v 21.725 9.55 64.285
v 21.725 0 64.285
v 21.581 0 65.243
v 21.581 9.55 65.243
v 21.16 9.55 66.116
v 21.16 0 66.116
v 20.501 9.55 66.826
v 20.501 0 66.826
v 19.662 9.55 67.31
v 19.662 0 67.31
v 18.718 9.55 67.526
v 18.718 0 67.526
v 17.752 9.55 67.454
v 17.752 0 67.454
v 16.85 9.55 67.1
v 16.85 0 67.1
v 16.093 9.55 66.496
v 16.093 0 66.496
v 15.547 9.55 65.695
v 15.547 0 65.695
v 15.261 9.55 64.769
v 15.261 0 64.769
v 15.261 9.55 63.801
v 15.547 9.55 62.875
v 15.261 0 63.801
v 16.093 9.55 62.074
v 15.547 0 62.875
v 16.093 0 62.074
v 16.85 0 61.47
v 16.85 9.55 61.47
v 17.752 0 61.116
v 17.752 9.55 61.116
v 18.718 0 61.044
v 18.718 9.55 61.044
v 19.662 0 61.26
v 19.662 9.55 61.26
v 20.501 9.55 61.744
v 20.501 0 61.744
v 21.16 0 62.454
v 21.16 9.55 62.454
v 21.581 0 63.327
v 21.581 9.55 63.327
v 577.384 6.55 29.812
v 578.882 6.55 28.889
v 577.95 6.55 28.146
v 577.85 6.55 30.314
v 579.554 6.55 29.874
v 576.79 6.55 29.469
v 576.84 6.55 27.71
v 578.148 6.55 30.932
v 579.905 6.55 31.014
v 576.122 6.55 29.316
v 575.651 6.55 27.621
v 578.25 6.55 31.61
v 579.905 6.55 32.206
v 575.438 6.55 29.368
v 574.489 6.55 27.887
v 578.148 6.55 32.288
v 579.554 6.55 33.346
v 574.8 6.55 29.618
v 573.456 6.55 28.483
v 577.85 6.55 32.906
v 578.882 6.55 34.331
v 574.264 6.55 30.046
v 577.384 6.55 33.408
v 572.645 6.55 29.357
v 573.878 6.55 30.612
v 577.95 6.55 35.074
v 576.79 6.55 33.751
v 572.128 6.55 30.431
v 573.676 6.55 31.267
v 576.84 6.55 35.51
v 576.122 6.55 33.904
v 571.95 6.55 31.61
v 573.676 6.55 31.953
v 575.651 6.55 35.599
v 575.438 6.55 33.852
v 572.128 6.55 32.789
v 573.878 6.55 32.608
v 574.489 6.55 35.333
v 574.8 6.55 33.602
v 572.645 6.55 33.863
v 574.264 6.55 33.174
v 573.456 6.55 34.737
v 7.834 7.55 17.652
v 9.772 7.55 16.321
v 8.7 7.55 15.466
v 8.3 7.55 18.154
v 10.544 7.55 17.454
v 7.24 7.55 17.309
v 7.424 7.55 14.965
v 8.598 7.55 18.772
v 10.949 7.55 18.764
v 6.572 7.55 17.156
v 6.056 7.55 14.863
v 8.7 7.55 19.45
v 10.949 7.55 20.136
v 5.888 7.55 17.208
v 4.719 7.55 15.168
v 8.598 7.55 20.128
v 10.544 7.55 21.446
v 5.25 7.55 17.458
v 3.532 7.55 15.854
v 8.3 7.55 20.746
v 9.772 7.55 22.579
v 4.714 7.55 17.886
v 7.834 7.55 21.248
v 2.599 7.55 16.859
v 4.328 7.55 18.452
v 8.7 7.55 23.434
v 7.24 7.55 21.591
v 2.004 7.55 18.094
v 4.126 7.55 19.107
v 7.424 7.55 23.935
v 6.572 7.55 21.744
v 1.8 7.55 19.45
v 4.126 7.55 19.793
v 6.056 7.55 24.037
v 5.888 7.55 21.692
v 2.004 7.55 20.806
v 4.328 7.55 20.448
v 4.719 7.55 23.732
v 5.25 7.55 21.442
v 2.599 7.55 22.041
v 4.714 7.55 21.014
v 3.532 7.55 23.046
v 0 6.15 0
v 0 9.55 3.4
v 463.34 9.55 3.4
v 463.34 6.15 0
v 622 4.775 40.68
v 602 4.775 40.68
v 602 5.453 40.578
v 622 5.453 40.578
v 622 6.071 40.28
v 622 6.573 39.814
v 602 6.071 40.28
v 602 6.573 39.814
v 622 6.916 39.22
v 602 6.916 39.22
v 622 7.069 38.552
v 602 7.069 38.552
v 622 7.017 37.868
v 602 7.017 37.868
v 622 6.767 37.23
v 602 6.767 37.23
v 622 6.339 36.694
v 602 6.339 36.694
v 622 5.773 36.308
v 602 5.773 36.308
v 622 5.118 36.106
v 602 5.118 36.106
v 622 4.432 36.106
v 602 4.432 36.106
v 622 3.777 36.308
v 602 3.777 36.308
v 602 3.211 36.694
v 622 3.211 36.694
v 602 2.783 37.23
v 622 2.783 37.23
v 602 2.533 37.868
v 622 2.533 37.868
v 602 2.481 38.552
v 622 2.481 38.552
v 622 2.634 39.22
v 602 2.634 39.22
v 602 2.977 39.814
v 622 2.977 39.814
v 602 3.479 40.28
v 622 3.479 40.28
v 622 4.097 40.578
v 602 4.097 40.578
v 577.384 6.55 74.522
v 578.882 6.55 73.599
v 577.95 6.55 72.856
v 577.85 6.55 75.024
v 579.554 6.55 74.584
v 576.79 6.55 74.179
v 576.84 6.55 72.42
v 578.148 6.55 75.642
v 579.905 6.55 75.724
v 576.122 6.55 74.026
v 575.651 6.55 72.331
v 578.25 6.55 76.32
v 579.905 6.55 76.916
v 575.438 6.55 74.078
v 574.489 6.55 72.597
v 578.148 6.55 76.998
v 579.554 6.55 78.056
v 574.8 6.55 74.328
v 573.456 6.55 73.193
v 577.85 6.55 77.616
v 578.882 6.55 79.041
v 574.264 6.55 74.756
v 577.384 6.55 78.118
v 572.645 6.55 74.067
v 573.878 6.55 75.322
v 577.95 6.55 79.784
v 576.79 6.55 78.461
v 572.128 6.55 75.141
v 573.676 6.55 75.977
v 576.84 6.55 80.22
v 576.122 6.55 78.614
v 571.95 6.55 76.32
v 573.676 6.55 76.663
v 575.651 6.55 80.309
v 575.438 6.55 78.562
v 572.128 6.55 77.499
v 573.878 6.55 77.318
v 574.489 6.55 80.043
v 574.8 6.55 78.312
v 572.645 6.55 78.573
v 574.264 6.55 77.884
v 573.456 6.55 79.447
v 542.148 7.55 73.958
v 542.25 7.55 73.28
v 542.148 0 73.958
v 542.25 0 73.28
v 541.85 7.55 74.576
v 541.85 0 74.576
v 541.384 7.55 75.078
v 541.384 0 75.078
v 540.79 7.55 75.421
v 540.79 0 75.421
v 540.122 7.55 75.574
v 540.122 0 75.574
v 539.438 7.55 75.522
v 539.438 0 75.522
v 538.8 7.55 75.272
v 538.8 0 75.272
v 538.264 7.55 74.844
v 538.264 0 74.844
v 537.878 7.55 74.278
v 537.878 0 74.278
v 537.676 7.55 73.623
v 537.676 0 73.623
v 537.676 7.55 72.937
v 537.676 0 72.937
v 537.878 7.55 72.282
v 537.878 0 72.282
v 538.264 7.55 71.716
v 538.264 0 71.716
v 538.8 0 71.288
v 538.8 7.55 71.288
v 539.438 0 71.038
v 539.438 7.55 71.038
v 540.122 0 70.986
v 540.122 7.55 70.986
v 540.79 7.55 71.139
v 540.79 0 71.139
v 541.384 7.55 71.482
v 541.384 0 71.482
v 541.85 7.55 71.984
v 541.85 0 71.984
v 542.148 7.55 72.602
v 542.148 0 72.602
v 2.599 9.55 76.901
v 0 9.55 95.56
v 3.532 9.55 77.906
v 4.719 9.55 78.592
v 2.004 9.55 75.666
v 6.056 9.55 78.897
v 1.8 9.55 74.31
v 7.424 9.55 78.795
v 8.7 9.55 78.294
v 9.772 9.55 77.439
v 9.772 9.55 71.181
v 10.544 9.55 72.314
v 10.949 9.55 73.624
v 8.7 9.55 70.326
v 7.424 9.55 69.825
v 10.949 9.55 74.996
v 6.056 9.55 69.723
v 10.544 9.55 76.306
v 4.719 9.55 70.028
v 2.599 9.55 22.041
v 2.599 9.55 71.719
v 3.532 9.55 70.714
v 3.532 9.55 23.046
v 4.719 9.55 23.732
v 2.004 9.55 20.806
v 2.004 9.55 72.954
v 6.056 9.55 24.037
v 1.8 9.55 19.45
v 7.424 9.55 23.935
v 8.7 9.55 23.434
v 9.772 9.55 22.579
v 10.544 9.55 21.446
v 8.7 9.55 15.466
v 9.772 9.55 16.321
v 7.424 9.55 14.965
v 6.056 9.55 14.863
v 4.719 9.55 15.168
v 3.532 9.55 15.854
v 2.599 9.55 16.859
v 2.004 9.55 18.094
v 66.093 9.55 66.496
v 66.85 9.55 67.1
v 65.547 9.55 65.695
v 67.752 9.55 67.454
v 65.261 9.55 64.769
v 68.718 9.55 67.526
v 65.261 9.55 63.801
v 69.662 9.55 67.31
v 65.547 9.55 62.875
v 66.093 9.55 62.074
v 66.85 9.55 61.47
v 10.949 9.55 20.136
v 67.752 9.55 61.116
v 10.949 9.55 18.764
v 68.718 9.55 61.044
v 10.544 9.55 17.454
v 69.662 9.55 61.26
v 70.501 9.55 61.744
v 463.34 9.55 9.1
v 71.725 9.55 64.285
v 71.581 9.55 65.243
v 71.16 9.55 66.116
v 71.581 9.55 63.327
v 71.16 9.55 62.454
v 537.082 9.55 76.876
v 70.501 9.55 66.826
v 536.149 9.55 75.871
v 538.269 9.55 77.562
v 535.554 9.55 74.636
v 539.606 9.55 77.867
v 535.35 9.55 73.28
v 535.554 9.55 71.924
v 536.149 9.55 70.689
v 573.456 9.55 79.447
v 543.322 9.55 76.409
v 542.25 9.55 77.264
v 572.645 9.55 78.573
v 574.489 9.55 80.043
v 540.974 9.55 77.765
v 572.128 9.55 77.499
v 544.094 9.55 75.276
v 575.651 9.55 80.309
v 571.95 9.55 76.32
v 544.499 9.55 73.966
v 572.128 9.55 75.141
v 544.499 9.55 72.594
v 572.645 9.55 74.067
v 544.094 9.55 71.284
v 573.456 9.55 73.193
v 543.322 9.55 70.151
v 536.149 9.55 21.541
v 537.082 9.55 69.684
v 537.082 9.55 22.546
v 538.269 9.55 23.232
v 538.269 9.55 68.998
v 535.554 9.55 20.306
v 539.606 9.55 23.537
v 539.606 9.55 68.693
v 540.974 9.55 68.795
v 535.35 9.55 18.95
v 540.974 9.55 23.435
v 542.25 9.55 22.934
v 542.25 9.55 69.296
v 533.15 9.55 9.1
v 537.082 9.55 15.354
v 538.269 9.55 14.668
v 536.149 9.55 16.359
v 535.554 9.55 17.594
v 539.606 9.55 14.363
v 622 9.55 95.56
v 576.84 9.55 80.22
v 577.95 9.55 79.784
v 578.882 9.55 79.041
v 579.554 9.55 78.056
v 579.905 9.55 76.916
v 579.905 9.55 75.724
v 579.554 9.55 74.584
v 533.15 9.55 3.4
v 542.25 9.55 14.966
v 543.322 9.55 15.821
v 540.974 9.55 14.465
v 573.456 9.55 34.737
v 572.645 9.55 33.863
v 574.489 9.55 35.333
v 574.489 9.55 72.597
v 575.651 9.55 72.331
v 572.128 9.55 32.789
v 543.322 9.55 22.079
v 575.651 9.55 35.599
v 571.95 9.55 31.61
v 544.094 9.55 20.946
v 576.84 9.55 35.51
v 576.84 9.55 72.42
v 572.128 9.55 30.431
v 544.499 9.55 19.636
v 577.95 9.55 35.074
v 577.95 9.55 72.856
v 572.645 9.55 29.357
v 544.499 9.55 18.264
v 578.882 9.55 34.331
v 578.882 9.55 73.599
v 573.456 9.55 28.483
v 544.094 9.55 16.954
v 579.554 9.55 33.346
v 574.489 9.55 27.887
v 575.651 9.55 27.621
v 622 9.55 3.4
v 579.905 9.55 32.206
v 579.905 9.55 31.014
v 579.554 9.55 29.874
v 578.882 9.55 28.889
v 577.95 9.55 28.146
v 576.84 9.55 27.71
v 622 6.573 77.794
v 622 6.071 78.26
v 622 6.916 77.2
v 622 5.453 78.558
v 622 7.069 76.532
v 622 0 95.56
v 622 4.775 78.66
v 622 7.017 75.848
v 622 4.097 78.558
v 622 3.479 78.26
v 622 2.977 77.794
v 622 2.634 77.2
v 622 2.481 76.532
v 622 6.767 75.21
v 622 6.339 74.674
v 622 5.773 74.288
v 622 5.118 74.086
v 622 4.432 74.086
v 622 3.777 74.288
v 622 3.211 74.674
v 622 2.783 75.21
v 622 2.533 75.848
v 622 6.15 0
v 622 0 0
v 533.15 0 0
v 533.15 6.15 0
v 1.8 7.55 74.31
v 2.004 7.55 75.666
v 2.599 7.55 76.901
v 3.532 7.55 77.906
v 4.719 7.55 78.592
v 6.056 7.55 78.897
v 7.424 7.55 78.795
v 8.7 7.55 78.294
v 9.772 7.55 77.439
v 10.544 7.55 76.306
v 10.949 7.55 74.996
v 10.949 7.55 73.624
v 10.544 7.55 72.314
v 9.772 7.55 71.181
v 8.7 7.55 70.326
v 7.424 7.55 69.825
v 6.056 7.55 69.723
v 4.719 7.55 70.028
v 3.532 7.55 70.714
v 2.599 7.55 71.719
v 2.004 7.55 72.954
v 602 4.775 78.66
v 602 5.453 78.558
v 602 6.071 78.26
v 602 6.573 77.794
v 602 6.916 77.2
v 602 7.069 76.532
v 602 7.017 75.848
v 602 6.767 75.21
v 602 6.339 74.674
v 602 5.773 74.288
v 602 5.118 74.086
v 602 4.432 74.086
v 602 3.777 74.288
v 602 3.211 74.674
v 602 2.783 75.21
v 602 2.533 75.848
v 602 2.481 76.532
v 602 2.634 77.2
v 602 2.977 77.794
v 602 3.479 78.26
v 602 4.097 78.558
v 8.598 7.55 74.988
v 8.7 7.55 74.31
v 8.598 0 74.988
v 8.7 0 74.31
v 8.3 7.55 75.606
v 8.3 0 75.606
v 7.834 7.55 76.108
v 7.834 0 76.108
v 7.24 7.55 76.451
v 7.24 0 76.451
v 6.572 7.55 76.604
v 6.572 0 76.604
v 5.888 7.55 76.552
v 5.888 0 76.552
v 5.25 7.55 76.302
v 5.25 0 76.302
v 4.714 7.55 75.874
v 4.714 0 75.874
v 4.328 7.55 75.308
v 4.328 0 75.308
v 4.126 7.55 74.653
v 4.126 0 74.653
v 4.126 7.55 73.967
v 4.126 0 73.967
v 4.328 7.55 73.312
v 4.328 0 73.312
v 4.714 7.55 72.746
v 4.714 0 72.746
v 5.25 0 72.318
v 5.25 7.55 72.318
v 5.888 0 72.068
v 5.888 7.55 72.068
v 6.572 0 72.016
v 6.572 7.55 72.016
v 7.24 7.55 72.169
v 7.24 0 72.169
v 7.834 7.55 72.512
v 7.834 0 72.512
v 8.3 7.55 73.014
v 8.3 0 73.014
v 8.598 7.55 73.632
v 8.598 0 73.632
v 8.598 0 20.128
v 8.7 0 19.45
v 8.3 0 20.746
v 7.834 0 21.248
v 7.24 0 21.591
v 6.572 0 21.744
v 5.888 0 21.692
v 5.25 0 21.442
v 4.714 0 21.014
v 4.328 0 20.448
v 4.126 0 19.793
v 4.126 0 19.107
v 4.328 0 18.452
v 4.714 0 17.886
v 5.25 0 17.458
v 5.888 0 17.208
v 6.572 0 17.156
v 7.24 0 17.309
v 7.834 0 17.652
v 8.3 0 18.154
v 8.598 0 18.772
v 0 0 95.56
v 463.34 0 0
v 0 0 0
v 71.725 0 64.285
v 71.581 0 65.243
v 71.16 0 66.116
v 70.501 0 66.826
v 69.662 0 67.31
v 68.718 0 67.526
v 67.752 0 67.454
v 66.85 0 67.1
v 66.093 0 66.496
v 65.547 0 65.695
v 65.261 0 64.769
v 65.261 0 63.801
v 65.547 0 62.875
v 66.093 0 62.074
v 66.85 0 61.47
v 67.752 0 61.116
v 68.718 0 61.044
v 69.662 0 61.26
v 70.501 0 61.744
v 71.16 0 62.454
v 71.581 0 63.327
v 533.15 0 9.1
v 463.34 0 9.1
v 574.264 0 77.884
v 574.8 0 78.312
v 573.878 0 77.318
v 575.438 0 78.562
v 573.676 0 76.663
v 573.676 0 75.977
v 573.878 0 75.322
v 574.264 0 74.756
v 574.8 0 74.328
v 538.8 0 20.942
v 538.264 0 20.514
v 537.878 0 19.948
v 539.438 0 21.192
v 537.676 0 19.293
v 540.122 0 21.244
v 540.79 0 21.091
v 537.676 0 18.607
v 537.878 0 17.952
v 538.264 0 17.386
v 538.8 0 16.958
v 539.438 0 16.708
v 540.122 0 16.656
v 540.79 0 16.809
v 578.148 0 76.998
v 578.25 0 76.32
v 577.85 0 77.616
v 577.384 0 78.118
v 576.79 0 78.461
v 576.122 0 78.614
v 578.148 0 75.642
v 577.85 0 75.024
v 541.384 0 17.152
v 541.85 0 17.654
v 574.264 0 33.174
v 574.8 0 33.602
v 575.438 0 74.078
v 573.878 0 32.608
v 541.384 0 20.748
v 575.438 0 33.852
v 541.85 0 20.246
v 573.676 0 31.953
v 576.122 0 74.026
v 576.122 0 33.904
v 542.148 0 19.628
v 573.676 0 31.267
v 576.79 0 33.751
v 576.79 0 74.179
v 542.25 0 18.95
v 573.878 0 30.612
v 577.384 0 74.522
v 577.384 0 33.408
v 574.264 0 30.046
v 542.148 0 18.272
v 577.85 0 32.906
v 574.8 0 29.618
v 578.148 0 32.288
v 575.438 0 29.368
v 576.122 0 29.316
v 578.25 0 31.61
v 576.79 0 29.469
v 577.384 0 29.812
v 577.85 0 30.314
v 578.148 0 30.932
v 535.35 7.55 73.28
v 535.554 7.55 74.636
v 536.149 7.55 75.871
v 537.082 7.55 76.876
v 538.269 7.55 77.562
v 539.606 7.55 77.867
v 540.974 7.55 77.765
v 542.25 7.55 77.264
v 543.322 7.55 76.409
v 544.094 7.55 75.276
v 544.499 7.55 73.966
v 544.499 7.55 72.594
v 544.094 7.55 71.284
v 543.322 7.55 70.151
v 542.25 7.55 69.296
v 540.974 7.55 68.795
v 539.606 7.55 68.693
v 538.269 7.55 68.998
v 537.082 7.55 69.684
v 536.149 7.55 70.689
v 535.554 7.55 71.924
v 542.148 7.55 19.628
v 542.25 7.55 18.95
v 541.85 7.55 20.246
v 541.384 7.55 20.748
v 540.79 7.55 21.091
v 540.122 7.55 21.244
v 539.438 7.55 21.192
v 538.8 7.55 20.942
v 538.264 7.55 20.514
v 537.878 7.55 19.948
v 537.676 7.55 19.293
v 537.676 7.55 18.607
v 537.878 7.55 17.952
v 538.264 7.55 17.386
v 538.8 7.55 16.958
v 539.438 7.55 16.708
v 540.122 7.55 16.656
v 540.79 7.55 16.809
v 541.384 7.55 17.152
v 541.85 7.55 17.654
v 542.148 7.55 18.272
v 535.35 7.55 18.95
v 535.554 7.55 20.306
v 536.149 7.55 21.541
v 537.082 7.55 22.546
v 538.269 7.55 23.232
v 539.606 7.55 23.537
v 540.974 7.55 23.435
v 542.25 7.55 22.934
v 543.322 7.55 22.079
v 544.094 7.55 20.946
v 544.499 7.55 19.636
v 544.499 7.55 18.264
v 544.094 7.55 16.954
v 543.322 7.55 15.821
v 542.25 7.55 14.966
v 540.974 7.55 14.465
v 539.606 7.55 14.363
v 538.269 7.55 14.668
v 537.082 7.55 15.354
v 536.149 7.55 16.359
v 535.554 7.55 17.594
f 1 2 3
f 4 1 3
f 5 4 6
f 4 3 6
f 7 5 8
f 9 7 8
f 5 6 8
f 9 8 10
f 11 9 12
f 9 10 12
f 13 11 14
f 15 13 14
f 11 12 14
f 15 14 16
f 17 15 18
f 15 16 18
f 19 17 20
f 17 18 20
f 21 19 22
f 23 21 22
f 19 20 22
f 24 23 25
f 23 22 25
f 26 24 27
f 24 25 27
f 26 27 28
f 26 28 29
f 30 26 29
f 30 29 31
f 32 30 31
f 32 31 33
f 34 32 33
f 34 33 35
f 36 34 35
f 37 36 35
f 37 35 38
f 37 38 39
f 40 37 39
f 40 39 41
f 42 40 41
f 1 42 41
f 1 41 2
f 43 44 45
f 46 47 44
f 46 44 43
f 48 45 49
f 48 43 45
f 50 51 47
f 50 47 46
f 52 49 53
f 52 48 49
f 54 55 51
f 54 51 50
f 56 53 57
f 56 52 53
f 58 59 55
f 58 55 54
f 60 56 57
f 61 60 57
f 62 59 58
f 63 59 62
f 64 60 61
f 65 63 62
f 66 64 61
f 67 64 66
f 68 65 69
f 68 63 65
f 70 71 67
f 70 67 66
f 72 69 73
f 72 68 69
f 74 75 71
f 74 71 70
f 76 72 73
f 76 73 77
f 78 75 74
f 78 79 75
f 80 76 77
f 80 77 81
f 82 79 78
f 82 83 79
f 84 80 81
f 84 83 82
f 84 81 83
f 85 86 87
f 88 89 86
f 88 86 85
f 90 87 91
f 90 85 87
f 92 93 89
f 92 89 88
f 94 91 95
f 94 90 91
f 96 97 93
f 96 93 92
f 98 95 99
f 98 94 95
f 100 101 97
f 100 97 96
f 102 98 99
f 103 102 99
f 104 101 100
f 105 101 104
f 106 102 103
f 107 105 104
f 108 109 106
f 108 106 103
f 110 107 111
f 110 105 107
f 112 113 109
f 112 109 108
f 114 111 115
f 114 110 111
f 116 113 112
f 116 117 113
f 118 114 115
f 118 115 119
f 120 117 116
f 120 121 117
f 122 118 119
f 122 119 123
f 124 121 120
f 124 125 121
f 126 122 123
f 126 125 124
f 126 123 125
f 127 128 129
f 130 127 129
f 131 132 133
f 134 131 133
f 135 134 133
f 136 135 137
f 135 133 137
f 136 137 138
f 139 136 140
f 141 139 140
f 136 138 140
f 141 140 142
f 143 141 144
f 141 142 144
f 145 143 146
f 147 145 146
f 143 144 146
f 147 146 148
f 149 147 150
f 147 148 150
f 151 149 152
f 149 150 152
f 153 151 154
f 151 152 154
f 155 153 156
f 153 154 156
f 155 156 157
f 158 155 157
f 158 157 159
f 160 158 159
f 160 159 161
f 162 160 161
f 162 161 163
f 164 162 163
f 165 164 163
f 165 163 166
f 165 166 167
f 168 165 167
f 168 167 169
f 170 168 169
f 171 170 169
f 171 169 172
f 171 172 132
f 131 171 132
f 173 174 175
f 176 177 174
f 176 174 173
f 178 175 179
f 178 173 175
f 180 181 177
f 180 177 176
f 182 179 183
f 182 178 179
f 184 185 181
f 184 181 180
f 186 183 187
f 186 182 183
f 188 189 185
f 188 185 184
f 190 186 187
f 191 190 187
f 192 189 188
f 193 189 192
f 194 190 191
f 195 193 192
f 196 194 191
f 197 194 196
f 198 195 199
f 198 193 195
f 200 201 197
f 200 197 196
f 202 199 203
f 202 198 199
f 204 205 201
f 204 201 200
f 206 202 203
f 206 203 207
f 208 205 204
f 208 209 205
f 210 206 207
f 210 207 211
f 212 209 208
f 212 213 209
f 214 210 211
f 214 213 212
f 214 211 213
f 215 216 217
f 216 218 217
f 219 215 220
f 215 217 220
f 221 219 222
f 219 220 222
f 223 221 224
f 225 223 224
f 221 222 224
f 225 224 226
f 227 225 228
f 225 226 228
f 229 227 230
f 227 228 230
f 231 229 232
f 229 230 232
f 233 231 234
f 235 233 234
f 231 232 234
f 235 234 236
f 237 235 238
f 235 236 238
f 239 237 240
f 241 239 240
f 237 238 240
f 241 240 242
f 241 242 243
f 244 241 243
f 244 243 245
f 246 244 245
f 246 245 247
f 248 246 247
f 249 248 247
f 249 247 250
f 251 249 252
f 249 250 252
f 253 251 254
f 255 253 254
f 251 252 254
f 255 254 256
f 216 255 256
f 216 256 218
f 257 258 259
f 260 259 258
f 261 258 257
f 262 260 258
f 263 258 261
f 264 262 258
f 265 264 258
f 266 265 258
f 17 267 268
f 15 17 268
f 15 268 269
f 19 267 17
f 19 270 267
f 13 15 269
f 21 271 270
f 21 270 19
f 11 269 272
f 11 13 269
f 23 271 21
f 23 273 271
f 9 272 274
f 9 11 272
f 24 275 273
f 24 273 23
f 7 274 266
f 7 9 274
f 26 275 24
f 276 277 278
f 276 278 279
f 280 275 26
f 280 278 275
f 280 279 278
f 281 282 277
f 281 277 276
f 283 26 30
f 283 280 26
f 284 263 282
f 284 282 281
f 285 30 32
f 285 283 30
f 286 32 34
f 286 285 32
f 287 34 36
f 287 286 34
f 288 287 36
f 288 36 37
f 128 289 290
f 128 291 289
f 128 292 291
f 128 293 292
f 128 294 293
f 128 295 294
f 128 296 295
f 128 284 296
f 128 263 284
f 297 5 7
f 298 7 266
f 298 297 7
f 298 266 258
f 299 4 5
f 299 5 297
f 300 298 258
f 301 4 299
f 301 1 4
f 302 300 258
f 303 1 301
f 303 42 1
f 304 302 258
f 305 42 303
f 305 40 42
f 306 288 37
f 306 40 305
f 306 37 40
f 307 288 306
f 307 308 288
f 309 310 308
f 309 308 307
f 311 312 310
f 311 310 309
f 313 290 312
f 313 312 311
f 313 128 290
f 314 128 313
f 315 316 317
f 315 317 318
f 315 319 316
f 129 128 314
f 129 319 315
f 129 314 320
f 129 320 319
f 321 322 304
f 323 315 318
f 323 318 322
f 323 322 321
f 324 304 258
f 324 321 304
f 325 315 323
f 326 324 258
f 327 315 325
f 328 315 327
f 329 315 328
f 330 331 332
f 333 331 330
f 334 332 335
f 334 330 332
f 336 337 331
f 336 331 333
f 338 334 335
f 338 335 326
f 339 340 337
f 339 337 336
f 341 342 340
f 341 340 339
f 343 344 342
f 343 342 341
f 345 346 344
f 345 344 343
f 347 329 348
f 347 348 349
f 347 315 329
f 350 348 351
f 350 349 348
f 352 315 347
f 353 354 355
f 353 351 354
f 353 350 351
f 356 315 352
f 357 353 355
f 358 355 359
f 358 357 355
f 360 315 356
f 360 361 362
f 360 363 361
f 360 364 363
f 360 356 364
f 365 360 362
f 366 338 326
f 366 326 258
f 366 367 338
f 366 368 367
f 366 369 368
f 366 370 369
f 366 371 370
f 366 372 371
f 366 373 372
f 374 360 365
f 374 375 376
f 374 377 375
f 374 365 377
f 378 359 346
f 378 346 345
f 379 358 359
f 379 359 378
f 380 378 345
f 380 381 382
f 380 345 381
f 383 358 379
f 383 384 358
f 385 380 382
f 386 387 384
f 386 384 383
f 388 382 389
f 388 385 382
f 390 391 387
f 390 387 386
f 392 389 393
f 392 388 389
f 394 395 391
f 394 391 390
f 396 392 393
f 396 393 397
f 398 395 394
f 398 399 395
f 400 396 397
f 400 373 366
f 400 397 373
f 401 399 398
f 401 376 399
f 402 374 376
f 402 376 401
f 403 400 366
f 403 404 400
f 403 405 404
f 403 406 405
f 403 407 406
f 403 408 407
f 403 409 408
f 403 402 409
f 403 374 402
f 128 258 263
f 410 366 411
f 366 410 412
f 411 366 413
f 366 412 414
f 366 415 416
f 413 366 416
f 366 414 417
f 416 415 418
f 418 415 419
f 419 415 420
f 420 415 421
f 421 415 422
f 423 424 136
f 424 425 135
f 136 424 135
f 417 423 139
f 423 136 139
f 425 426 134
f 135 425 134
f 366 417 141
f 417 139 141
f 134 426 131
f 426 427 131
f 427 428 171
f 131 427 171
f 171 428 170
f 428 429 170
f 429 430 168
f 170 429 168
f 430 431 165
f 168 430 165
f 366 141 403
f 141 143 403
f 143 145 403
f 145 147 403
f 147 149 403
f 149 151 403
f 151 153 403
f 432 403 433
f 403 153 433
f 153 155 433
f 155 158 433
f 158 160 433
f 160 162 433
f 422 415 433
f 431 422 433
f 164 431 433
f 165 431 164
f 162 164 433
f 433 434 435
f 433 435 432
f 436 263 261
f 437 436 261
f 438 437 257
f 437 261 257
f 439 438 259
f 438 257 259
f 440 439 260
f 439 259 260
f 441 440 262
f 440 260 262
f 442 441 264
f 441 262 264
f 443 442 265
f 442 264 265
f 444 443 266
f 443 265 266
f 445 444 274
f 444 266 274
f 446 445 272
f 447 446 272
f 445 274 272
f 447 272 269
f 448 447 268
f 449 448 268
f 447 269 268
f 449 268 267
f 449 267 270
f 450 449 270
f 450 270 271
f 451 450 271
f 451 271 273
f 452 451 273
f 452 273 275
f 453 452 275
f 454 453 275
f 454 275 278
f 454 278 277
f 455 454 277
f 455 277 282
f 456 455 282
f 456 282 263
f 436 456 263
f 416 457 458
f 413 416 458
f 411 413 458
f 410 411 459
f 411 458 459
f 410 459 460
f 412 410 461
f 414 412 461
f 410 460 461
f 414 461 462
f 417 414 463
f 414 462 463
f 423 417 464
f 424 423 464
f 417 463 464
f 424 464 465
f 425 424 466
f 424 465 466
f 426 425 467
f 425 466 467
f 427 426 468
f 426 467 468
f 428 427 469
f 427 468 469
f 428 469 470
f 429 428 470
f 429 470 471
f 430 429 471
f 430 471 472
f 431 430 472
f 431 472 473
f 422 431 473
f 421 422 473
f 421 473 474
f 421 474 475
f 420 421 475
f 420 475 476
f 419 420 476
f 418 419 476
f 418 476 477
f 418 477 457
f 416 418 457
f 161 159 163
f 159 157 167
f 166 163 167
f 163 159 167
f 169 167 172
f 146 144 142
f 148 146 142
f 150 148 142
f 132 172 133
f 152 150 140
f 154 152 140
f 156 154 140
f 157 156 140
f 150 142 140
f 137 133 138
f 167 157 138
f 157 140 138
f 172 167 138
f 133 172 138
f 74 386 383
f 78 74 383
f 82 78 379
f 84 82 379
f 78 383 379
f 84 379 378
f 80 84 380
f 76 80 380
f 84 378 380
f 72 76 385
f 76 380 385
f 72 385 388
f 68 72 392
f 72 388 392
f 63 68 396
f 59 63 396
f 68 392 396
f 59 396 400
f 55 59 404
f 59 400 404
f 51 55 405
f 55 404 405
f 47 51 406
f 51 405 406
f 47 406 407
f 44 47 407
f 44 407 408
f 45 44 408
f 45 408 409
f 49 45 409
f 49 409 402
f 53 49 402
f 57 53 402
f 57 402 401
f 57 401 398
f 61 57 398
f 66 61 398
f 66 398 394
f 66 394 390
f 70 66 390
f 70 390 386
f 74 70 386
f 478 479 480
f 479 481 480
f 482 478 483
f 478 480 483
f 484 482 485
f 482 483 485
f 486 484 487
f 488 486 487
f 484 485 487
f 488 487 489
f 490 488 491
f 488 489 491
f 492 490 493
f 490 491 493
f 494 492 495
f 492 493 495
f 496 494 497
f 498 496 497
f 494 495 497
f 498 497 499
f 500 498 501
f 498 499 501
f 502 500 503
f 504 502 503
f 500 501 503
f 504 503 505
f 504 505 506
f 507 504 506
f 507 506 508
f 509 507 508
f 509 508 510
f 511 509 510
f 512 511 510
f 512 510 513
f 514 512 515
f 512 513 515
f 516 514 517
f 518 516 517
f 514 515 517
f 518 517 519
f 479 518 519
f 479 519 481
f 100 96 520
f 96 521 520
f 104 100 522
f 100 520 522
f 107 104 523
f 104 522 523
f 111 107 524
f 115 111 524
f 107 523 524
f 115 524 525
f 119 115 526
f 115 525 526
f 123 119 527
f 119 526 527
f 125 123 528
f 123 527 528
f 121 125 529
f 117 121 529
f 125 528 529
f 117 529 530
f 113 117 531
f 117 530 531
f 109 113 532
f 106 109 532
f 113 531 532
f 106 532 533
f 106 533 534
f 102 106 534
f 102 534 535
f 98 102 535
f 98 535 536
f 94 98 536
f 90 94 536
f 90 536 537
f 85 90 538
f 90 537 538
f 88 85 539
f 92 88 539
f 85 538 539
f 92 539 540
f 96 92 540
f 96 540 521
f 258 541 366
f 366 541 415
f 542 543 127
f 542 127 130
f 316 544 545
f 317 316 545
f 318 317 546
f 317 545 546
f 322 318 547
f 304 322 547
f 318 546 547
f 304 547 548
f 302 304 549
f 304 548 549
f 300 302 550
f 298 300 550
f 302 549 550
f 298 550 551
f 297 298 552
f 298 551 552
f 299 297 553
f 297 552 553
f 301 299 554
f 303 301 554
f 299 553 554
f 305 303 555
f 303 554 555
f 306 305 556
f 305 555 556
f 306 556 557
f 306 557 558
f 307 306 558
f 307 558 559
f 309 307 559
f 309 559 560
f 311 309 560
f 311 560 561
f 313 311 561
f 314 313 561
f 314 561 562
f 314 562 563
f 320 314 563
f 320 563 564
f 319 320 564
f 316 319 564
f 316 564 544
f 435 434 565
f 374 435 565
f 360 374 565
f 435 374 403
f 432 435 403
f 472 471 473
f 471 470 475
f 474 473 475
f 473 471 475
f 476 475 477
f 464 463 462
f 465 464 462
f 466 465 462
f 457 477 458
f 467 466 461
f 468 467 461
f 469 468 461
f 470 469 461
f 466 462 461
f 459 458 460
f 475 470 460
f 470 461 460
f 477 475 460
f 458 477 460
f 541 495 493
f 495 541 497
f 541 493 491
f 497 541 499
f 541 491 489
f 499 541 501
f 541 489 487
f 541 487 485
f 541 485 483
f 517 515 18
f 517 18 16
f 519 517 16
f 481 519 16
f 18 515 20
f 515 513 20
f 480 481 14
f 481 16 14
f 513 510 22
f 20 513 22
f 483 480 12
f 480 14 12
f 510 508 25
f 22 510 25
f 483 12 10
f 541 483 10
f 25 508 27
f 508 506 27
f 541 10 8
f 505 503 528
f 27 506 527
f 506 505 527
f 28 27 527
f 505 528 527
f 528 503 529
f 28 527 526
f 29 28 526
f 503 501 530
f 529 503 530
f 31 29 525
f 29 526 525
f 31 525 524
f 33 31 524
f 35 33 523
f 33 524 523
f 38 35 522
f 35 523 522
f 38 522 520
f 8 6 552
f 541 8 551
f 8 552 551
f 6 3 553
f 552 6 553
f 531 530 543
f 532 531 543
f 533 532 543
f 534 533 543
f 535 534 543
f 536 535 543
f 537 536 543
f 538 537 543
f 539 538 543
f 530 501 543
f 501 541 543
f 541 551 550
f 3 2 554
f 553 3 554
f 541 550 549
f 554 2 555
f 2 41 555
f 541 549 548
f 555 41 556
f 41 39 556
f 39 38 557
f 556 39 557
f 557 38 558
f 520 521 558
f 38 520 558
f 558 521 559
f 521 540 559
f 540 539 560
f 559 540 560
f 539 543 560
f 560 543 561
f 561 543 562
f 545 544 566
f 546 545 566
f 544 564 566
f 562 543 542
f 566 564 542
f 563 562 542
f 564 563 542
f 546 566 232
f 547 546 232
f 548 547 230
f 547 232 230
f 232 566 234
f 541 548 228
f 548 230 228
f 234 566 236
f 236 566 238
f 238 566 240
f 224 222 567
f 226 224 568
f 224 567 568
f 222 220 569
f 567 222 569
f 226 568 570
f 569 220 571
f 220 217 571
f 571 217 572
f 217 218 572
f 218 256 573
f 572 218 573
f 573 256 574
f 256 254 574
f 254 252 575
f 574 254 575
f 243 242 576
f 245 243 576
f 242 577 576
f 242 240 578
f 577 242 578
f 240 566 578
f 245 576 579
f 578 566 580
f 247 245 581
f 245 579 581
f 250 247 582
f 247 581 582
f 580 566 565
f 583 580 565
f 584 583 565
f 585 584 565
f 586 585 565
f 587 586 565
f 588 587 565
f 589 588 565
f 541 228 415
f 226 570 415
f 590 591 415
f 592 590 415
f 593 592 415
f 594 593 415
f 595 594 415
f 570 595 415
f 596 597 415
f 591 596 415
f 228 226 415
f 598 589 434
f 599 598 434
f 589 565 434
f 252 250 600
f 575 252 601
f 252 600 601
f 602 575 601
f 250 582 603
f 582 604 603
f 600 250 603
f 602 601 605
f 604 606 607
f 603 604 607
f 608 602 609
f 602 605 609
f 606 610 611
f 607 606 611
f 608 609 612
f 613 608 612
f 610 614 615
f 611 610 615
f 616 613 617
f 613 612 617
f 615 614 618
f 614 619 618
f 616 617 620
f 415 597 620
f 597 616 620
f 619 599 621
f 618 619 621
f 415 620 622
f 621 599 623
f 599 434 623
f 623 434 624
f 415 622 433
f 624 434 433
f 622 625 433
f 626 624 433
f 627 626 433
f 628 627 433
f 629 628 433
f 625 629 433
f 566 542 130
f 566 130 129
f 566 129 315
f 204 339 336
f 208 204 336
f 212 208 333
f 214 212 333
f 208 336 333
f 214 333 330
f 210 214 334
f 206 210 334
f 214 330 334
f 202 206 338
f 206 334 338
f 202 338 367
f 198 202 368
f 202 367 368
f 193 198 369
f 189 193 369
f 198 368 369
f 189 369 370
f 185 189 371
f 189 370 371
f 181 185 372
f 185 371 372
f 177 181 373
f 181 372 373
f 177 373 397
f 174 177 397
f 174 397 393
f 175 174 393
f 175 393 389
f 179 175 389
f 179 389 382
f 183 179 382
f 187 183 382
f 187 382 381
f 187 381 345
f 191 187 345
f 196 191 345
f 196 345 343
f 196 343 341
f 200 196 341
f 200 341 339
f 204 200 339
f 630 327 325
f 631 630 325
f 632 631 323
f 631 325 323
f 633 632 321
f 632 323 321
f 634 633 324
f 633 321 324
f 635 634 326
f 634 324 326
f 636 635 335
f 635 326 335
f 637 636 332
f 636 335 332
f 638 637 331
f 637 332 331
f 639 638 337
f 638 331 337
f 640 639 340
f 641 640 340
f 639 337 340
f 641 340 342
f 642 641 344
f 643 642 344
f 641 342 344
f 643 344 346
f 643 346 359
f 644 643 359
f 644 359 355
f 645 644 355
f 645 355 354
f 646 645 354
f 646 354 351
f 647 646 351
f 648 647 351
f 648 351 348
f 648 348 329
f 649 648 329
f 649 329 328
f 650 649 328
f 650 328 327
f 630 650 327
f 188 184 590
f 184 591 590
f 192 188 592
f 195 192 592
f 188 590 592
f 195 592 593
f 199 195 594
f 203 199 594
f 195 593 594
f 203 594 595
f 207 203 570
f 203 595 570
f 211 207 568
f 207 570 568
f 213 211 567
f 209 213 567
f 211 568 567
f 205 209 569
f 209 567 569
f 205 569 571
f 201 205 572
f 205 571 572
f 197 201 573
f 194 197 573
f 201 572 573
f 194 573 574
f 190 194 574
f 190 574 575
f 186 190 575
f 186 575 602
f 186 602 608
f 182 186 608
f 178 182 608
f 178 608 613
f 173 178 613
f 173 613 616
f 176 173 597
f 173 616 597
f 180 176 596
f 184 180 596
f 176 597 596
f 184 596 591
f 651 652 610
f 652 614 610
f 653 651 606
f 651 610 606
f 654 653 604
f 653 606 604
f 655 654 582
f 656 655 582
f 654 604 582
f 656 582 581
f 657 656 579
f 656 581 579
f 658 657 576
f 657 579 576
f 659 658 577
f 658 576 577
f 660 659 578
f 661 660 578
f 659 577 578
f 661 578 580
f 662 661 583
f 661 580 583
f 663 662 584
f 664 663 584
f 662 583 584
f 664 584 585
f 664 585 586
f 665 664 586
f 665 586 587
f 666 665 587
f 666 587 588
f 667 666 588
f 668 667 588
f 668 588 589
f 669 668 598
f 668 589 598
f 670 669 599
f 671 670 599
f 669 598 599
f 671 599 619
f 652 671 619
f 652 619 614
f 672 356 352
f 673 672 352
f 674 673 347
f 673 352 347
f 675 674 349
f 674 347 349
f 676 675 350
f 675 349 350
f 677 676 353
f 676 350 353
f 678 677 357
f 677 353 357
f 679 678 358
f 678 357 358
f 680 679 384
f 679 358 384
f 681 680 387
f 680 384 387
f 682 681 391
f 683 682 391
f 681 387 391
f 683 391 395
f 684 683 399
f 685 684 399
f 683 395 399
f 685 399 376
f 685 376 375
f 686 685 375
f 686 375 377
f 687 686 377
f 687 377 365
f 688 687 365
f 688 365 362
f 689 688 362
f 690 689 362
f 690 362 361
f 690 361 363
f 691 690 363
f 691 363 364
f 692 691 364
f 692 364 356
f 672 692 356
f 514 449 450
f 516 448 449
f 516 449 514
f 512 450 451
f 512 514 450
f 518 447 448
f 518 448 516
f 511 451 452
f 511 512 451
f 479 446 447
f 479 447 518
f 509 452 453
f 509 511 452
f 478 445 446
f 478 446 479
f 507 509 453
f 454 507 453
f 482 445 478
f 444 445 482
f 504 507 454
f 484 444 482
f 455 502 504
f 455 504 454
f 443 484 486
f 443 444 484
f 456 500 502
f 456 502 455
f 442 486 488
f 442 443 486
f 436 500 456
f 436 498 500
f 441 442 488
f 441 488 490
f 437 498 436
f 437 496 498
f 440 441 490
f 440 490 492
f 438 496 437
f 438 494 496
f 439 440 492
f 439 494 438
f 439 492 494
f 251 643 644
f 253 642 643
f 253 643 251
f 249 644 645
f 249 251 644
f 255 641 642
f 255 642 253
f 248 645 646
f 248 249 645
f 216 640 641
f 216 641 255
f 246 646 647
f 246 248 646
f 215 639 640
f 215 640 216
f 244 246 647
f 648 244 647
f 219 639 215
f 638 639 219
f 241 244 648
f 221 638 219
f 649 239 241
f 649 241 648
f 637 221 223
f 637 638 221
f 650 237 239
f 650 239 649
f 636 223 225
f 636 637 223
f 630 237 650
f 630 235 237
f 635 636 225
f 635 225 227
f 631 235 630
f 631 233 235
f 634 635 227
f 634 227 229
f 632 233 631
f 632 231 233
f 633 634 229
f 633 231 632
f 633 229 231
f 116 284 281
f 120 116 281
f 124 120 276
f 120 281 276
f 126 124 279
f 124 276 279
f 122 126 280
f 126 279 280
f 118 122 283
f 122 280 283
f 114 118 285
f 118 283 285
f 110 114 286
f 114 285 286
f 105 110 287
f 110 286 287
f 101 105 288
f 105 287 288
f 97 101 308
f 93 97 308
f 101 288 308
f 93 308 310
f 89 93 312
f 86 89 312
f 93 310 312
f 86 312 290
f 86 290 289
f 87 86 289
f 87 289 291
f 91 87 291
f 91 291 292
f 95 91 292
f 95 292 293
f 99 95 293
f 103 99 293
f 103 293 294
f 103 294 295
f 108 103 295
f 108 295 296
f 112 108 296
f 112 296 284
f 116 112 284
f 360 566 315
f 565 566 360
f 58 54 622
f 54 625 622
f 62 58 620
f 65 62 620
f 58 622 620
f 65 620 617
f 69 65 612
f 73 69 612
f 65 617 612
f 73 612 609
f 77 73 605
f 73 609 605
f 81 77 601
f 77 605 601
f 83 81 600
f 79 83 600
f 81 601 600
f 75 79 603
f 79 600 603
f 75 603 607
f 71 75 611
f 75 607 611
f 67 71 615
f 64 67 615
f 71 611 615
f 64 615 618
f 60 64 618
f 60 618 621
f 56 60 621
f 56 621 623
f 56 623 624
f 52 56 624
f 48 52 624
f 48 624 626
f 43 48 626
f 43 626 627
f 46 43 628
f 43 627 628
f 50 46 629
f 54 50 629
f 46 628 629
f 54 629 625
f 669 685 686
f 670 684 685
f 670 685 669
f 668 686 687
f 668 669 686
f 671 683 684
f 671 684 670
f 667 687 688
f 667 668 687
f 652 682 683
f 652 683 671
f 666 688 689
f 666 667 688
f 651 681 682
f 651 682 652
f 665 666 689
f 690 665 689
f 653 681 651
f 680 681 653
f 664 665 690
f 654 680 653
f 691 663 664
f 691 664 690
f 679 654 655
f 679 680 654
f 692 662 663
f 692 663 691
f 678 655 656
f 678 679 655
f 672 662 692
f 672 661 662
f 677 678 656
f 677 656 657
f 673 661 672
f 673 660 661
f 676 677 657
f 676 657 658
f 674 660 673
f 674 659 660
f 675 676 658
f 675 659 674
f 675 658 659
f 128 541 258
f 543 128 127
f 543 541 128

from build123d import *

# Parameters (mm, degrees)
SKETCH1_W           = 622
SKETCH1_H           = 95.56
BOSS_EXTRUDE1_DEPTH = 9.55
HOLE2_D             = 6.5
HOLE5_D             = 4.6
HOLE5_CBORE_D       = 9.2
HOLE5_CBORE_DEPTH   = 2
HOLE6_D             = 4.6
HOLE6_CBORE_D       = 8
HOLE6_CBORE_DEPTH   = 3
CHAMFER1_SIZE       = 3.4
SKETCH16_W          = 69.81
SKETCH16_H          = 9.1
CUT_EXTRUDE1_DEPTH  = 630.370253587
HOLE7_D             = 4.6
HOLE7_DEPTH         = 20


with BuildPart() as part:
    # Sketch1 → Boss-Extrude1 (new body)
    with BuildSketch(Plane(origin=(0, 0, 0), x_dir=(1, 0, 0), z_dir=(0, 1, 0))):
        with Locations((311, -47.78)):
            Rectangle(SKETCH1_W, SKETCH1_H)
    extrude(amount=BOSS_EXTRUDE1_DEPTH)

    # Hole2 (through all)
    with Locations(Plane(origin=(0, 9.55, 0), x_dir=(-1, 0, 0), z_dir=(0, 1, 0))):
        with Locations((-18.475, 64.285), (-68.475, 64.285)):
            Hole(HOLE2_D / 2)

    # Hole5 (through all)
    with Locations(Plane(origin=(0, 9.55, 0), x_dir=(-1, 0, 0), z_dir=(0, 1, 0))):
        with Locations((-6.4, 19.45), (-6.4, 74.31), (-539.95, 18.95), (-539.95, 73.28)):
            CounterBoreHole(HOLE5_D / 2, HOLE5_CBORE_D / 2, HOLE5_CBORE_DEPTH)

    # Hole6 (through all)
    with Locations(Plane(origin=(0, 9.55, 0), x_dir=(-1, 0, 0), z_dir=(0, 1, 0))):
        with Locations((-575.95, 31.61), (-575.95, 76.32)):
            CounterBoreHole(HOLE6_D / 2, HOLE6_CBORE_D / 2, HOLE6_CBORE_DEPTH)

    # Chamfer1
    chamfer1_edges = [part.edges().sort_by_distance(p)[0] for p in [
        (311, 9.55, 0),
    ]]
    chamfer(chamfer1_edges, length=CHAMFER1_SIZE)

    # Sketch16 → Cut-Extrude1 (cut, through all)
    with BuildSketch(Plane.XZ):
        with Locations((498.245, 4.55)):
            Rectangle(SKETCH16_W, SKETCH16_H)
    extrude(amount=-CUT_EXTRUDE1_DEPTH, mode=Mode.SUBTRACT)

    # Hole7
    with Locations(Plane(origin=(622, 0, 0), x_dir=(0, 0, -1), z_dir=(1, 0, 0))):
        with Locations((-76.36, 4.775), (-38.38, 4.775)):
            Hole(HOLE7_D / 2, depth=HOLE7_DEPTH)


solid = part.part
